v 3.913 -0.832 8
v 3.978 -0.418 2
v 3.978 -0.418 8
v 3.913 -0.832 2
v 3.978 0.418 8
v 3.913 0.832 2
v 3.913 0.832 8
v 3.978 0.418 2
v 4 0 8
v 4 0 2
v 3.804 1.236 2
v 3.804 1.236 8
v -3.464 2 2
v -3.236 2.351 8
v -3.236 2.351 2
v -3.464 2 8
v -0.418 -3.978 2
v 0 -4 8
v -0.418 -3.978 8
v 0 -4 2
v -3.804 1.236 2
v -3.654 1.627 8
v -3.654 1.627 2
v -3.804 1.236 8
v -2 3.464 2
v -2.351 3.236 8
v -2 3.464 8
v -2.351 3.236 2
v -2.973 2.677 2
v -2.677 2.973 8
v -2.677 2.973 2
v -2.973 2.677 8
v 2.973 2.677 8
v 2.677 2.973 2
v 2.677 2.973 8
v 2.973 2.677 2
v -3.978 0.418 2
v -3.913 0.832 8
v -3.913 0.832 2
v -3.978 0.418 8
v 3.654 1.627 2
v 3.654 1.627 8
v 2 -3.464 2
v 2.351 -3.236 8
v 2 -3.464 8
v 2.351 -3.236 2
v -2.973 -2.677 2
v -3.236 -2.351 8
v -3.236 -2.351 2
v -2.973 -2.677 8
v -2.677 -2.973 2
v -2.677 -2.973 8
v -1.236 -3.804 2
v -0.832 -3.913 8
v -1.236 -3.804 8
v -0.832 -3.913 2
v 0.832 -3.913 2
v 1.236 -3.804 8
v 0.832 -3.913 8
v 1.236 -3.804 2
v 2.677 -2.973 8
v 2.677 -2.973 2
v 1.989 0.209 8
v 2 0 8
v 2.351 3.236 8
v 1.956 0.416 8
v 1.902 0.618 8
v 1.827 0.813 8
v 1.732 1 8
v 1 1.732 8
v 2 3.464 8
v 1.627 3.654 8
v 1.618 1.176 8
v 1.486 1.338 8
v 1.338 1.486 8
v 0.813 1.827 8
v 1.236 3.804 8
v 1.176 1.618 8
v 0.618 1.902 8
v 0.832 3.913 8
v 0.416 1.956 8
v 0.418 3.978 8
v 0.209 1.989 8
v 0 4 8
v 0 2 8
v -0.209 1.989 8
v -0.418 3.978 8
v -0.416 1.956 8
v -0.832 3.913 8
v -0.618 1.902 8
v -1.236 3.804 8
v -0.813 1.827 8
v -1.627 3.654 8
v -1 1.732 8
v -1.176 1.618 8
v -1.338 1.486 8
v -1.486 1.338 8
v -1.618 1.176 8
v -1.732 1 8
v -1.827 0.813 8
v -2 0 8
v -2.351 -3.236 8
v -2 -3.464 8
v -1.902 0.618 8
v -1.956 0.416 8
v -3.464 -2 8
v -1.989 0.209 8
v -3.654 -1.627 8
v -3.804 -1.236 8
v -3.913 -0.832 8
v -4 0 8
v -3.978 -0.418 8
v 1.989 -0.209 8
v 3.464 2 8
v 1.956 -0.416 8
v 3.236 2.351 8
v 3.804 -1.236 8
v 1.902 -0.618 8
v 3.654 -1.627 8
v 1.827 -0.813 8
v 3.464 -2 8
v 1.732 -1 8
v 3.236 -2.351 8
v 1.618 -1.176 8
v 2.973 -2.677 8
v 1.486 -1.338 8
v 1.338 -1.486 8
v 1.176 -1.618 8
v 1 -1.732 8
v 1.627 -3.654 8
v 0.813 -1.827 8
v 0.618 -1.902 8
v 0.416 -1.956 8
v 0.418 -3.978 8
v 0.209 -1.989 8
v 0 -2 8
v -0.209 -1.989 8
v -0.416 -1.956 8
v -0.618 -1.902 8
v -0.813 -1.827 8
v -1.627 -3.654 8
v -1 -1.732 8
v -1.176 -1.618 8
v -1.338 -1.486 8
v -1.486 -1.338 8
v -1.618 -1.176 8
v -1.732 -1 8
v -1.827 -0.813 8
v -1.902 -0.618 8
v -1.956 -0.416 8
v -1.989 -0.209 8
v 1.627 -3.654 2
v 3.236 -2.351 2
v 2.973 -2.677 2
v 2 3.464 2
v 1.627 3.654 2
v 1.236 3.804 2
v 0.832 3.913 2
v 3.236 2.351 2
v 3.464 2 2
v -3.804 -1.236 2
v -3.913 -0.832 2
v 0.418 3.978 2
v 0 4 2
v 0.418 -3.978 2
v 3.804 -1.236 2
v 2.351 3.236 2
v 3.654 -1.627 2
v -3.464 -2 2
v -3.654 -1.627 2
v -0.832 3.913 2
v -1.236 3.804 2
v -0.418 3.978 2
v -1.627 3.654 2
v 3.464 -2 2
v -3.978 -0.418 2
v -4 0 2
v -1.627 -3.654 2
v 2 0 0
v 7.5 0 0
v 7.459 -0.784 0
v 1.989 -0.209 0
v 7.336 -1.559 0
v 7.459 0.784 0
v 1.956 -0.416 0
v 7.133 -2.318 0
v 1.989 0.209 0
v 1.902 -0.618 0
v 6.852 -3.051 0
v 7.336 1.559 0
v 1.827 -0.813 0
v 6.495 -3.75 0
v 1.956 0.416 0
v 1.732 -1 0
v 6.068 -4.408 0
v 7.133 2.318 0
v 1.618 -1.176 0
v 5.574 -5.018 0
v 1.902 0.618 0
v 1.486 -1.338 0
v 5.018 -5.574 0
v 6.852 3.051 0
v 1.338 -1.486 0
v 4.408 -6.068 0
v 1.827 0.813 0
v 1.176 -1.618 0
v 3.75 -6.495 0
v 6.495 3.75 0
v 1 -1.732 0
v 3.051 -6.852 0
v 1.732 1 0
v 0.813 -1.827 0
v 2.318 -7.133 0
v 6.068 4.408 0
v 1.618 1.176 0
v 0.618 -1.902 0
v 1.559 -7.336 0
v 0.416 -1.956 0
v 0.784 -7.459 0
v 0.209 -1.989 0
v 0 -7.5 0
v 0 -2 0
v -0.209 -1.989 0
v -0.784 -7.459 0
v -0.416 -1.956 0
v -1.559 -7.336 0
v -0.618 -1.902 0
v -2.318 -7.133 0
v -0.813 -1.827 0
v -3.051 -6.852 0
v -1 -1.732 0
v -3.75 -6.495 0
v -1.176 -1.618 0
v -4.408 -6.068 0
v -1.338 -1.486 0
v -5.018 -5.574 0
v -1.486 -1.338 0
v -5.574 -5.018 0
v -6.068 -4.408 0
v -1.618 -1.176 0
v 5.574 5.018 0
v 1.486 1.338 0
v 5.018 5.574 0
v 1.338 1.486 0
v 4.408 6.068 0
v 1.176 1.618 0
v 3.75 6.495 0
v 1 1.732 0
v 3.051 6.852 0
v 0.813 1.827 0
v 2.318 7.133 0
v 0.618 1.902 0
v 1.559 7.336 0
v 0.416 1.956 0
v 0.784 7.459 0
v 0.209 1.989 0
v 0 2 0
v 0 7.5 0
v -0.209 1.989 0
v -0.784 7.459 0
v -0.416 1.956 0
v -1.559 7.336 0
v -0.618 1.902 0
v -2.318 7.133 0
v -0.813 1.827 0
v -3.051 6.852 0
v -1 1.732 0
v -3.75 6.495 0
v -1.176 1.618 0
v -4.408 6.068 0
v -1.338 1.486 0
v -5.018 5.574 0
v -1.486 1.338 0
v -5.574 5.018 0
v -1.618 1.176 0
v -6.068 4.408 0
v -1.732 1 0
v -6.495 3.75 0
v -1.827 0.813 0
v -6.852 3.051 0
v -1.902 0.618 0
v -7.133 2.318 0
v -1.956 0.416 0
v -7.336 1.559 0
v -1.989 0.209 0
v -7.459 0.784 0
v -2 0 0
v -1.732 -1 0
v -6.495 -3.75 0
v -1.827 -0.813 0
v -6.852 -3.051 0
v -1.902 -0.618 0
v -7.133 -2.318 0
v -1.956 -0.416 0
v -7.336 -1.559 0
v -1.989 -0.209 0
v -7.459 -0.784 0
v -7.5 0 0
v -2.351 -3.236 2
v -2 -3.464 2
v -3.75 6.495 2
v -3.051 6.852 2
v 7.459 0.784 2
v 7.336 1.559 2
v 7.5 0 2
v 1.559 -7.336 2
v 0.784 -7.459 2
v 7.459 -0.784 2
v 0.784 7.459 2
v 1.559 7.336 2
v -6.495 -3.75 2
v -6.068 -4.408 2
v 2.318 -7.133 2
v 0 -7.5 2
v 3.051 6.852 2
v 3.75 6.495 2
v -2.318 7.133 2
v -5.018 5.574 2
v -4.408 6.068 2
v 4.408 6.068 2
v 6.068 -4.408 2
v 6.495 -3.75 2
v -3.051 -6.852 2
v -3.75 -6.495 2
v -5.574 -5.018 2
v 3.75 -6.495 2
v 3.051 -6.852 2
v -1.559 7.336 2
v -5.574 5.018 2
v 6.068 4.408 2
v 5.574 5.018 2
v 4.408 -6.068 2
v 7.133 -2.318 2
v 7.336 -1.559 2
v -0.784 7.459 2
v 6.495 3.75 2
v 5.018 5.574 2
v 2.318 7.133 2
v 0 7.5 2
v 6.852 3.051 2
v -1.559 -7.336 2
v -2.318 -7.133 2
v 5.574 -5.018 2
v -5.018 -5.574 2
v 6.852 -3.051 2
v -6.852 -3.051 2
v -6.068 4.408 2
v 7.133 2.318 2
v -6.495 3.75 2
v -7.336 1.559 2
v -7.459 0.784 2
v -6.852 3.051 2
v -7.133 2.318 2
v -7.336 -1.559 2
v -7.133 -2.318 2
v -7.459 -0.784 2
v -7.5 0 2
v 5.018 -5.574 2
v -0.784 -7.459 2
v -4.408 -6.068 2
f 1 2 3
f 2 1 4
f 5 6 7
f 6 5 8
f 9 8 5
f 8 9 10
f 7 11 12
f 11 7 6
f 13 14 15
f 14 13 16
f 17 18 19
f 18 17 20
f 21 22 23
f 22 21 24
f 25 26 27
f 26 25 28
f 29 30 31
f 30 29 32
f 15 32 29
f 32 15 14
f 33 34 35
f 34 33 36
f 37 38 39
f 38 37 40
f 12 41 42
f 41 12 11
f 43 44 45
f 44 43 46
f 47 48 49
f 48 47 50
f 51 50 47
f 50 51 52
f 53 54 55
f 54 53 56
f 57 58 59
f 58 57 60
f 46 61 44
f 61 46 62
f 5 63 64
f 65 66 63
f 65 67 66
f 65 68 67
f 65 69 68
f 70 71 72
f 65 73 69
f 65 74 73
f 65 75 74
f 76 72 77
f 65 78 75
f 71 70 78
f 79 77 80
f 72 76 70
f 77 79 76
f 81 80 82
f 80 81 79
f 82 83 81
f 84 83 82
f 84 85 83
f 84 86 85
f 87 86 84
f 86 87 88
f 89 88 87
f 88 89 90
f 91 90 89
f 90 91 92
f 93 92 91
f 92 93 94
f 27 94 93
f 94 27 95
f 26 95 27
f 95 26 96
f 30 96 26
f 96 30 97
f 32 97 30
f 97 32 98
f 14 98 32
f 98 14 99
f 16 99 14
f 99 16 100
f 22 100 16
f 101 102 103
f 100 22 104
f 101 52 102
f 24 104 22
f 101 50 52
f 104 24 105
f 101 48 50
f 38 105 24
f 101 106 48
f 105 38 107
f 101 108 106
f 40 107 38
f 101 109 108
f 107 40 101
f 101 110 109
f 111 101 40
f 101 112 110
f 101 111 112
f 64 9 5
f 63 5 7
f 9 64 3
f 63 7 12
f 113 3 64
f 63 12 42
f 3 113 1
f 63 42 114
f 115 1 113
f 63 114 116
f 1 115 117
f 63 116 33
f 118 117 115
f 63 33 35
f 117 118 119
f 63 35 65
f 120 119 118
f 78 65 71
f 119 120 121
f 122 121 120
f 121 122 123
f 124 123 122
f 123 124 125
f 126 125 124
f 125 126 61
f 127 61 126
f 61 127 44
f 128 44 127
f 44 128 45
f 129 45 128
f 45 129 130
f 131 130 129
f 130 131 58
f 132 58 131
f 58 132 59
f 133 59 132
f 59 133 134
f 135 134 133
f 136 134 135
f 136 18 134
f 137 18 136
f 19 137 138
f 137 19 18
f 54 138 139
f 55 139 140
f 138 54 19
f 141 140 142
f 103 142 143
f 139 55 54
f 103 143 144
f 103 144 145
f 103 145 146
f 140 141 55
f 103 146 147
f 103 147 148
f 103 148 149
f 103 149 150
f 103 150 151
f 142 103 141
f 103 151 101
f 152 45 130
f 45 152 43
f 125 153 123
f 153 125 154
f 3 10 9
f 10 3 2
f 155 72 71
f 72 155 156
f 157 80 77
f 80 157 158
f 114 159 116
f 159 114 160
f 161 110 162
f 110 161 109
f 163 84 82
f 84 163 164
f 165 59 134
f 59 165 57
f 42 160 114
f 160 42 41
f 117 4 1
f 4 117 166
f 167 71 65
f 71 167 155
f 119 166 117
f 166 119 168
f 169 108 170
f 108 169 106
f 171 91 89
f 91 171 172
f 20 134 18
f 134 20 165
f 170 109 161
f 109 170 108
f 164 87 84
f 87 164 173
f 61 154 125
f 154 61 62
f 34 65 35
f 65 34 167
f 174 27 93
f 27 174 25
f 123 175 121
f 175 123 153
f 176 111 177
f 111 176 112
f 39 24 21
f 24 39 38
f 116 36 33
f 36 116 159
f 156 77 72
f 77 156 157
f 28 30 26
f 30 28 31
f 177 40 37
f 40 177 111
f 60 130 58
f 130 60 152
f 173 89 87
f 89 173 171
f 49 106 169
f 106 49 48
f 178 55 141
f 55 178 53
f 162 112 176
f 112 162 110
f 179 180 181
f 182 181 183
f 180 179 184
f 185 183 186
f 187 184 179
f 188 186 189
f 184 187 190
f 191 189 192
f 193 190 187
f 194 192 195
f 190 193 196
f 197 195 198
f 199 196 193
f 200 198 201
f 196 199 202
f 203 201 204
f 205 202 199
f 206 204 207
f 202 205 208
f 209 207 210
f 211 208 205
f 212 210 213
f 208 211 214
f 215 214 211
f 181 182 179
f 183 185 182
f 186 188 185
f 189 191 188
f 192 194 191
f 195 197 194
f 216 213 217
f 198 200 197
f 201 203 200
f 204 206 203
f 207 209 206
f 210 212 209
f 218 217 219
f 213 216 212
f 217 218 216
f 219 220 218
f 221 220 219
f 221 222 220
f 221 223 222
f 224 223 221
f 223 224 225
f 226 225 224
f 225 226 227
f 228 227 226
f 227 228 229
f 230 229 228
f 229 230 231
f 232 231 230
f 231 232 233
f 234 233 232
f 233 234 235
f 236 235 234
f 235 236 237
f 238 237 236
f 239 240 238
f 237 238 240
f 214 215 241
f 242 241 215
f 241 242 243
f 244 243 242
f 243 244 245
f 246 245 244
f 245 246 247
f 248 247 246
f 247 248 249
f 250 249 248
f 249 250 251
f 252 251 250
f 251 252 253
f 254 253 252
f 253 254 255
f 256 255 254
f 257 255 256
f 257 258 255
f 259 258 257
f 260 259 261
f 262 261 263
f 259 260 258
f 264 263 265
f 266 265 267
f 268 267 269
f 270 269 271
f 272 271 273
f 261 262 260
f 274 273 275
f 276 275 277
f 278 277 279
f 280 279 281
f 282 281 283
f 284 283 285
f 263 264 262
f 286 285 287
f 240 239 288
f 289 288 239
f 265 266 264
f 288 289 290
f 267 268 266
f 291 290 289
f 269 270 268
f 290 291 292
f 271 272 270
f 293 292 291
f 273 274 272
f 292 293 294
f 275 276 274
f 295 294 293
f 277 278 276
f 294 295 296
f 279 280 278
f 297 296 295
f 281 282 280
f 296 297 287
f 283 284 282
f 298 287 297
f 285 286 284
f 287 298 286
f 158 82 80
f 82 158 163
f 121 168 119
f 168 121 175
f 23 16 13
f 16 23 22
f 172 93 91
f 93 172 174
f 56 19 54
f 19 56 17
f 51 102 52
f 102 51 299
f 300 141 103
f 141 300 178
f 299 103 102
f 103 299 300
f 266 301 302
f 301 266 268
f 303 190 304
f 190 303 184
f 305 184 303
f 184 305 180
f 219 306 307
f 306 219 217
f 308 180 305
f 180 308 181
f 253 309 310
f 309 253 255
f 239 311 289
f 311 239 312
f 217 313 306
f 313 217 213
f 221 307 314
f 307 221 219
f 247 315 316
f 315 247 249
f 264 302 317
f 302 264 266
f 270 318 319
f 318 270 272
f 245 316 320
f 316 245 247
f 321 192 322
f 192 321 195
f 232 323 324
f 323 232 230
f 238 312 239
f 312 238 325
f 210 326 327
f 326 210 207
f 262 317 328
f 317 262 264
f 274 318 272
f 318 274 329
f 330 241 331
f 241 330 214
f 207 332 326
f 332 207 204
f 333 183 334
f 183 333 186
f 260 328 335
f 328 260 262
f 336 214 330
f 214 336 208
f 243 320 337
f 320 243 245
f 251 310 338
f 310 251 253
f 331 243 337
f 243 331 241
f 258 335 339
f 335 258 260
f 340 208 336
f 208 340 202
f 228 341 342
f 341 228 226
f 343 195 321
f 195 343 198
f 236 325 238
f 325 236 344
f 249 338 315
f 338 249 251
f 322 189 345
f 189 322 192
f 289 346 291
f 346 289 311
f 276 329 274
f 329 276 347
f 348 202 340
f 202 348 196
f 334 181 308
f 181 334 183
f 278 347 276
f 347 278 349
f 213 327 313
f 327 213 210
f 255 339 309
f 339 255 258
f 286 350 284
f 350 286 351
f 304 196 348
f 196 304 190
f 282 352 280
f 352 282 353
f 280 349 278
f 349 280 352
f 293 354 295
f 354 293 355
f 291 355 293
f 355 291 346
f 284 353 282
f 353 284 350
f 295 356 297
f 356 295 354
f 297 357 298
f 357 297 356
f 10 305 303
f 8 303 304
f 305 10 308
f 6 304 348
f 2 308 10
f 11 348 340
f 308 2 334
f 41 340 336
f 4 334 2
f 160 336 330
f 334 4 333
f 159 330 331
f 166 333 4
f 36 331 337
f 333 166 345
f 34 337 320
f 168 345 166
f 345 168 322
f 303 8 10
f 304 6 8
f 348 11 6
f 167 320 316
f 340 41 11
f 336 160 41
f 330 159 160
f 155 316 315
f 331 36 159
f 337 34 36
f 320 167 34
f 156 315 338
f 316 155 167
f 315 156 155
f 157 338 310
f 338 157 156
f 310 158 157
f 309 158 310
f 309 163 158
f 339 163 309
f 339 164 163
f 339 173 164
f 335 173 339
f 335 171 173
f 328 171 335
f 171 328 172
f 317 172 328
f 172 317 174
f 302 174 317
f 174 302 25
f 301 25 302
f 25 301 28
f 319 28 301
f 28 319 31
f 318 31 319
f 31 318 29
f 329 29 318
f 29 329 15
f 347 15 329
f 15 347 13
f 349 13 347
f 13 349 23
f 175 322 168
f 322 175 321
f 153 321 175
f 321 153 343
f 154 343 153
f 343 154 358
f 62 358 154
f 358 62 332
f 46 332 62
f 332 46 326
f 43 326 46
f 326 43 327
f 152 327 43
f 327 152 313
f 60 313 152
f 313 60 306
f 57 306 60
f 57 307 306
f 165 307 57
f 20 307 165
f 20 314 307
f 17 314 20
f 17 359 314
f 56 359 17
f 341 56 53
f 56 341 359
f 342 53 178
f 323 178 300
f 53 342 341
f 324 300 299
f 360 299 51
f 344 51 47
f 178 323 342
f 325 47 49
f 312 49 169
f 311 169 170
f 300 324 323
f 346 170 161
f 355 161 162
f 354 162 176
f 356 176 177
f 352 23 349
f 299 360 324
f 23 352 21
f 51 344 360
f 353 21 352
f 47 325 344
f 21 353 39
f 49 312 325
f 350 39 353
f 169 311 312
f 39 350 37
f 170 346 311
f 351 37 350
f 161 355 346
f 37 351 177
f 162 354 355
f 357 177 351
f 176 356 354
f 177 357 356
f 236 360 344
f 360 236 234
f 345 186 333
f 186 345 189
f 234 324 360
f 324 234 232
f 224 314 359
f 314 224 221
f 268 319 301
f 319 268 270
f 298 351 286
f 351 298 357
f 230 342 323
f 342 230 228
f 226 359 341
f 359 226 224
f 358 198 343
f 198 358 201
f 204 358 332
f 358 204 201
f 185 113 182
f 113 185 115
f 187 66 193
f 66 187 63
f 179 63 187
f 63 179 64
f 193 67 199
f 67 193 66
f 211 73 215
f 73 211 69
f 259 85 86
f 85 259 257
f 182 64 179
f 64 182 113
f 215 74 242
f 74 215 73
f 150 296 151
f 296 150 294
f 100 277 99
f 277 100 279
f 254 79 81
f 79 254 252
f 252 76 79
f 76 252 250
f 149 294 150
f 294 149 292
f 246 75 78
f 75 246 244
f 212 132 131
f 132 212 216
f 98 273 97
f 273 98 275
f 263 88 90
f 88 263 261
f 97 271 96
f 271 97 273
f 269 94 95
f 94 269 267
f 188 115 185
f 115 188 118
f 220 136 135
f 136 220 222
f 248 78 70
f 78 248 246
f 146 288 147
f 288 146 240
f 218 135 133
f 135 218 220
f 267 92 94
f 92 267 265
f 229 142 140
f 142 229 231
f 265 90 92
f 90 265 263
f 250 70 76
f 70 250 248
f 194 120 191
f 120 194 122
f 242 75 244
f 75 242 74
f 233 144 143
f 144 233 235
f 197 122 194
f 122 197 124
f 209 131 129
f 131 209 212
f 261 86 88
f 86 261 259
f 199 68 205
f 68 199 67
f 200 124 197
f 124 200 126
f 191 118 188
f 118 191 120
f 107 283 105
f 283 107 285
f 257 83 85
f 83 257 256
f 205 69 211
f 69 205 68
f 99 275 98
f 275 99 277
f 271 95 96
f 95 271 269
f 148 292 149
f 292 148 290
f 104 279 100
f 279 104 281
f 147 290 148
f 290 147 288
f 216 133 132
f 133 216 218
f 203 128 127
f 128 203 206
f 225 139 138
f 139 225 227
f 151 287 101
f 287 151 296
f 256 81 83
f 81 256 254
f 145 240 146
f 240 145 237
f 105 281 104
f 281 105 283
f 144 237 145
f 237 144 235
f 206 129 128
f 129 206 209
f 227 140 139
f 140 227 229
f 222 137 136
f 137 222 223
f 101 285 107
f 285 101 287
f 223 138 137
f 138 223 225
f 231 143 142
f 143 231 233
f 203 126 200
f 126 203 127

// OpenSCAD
// Flanged spacer.
$fn = 60;
eps = 0.02;
inner_d = 4;
outer_d = 8;
length = 8;
flange_d = 15;
difference() { union() { cylinder(d=outer_d,h=length); cylinder(d=flange_d,h=2); } translate([0,0,-eps]) cylinder(d=inner_d,h=length+2*eps); }
